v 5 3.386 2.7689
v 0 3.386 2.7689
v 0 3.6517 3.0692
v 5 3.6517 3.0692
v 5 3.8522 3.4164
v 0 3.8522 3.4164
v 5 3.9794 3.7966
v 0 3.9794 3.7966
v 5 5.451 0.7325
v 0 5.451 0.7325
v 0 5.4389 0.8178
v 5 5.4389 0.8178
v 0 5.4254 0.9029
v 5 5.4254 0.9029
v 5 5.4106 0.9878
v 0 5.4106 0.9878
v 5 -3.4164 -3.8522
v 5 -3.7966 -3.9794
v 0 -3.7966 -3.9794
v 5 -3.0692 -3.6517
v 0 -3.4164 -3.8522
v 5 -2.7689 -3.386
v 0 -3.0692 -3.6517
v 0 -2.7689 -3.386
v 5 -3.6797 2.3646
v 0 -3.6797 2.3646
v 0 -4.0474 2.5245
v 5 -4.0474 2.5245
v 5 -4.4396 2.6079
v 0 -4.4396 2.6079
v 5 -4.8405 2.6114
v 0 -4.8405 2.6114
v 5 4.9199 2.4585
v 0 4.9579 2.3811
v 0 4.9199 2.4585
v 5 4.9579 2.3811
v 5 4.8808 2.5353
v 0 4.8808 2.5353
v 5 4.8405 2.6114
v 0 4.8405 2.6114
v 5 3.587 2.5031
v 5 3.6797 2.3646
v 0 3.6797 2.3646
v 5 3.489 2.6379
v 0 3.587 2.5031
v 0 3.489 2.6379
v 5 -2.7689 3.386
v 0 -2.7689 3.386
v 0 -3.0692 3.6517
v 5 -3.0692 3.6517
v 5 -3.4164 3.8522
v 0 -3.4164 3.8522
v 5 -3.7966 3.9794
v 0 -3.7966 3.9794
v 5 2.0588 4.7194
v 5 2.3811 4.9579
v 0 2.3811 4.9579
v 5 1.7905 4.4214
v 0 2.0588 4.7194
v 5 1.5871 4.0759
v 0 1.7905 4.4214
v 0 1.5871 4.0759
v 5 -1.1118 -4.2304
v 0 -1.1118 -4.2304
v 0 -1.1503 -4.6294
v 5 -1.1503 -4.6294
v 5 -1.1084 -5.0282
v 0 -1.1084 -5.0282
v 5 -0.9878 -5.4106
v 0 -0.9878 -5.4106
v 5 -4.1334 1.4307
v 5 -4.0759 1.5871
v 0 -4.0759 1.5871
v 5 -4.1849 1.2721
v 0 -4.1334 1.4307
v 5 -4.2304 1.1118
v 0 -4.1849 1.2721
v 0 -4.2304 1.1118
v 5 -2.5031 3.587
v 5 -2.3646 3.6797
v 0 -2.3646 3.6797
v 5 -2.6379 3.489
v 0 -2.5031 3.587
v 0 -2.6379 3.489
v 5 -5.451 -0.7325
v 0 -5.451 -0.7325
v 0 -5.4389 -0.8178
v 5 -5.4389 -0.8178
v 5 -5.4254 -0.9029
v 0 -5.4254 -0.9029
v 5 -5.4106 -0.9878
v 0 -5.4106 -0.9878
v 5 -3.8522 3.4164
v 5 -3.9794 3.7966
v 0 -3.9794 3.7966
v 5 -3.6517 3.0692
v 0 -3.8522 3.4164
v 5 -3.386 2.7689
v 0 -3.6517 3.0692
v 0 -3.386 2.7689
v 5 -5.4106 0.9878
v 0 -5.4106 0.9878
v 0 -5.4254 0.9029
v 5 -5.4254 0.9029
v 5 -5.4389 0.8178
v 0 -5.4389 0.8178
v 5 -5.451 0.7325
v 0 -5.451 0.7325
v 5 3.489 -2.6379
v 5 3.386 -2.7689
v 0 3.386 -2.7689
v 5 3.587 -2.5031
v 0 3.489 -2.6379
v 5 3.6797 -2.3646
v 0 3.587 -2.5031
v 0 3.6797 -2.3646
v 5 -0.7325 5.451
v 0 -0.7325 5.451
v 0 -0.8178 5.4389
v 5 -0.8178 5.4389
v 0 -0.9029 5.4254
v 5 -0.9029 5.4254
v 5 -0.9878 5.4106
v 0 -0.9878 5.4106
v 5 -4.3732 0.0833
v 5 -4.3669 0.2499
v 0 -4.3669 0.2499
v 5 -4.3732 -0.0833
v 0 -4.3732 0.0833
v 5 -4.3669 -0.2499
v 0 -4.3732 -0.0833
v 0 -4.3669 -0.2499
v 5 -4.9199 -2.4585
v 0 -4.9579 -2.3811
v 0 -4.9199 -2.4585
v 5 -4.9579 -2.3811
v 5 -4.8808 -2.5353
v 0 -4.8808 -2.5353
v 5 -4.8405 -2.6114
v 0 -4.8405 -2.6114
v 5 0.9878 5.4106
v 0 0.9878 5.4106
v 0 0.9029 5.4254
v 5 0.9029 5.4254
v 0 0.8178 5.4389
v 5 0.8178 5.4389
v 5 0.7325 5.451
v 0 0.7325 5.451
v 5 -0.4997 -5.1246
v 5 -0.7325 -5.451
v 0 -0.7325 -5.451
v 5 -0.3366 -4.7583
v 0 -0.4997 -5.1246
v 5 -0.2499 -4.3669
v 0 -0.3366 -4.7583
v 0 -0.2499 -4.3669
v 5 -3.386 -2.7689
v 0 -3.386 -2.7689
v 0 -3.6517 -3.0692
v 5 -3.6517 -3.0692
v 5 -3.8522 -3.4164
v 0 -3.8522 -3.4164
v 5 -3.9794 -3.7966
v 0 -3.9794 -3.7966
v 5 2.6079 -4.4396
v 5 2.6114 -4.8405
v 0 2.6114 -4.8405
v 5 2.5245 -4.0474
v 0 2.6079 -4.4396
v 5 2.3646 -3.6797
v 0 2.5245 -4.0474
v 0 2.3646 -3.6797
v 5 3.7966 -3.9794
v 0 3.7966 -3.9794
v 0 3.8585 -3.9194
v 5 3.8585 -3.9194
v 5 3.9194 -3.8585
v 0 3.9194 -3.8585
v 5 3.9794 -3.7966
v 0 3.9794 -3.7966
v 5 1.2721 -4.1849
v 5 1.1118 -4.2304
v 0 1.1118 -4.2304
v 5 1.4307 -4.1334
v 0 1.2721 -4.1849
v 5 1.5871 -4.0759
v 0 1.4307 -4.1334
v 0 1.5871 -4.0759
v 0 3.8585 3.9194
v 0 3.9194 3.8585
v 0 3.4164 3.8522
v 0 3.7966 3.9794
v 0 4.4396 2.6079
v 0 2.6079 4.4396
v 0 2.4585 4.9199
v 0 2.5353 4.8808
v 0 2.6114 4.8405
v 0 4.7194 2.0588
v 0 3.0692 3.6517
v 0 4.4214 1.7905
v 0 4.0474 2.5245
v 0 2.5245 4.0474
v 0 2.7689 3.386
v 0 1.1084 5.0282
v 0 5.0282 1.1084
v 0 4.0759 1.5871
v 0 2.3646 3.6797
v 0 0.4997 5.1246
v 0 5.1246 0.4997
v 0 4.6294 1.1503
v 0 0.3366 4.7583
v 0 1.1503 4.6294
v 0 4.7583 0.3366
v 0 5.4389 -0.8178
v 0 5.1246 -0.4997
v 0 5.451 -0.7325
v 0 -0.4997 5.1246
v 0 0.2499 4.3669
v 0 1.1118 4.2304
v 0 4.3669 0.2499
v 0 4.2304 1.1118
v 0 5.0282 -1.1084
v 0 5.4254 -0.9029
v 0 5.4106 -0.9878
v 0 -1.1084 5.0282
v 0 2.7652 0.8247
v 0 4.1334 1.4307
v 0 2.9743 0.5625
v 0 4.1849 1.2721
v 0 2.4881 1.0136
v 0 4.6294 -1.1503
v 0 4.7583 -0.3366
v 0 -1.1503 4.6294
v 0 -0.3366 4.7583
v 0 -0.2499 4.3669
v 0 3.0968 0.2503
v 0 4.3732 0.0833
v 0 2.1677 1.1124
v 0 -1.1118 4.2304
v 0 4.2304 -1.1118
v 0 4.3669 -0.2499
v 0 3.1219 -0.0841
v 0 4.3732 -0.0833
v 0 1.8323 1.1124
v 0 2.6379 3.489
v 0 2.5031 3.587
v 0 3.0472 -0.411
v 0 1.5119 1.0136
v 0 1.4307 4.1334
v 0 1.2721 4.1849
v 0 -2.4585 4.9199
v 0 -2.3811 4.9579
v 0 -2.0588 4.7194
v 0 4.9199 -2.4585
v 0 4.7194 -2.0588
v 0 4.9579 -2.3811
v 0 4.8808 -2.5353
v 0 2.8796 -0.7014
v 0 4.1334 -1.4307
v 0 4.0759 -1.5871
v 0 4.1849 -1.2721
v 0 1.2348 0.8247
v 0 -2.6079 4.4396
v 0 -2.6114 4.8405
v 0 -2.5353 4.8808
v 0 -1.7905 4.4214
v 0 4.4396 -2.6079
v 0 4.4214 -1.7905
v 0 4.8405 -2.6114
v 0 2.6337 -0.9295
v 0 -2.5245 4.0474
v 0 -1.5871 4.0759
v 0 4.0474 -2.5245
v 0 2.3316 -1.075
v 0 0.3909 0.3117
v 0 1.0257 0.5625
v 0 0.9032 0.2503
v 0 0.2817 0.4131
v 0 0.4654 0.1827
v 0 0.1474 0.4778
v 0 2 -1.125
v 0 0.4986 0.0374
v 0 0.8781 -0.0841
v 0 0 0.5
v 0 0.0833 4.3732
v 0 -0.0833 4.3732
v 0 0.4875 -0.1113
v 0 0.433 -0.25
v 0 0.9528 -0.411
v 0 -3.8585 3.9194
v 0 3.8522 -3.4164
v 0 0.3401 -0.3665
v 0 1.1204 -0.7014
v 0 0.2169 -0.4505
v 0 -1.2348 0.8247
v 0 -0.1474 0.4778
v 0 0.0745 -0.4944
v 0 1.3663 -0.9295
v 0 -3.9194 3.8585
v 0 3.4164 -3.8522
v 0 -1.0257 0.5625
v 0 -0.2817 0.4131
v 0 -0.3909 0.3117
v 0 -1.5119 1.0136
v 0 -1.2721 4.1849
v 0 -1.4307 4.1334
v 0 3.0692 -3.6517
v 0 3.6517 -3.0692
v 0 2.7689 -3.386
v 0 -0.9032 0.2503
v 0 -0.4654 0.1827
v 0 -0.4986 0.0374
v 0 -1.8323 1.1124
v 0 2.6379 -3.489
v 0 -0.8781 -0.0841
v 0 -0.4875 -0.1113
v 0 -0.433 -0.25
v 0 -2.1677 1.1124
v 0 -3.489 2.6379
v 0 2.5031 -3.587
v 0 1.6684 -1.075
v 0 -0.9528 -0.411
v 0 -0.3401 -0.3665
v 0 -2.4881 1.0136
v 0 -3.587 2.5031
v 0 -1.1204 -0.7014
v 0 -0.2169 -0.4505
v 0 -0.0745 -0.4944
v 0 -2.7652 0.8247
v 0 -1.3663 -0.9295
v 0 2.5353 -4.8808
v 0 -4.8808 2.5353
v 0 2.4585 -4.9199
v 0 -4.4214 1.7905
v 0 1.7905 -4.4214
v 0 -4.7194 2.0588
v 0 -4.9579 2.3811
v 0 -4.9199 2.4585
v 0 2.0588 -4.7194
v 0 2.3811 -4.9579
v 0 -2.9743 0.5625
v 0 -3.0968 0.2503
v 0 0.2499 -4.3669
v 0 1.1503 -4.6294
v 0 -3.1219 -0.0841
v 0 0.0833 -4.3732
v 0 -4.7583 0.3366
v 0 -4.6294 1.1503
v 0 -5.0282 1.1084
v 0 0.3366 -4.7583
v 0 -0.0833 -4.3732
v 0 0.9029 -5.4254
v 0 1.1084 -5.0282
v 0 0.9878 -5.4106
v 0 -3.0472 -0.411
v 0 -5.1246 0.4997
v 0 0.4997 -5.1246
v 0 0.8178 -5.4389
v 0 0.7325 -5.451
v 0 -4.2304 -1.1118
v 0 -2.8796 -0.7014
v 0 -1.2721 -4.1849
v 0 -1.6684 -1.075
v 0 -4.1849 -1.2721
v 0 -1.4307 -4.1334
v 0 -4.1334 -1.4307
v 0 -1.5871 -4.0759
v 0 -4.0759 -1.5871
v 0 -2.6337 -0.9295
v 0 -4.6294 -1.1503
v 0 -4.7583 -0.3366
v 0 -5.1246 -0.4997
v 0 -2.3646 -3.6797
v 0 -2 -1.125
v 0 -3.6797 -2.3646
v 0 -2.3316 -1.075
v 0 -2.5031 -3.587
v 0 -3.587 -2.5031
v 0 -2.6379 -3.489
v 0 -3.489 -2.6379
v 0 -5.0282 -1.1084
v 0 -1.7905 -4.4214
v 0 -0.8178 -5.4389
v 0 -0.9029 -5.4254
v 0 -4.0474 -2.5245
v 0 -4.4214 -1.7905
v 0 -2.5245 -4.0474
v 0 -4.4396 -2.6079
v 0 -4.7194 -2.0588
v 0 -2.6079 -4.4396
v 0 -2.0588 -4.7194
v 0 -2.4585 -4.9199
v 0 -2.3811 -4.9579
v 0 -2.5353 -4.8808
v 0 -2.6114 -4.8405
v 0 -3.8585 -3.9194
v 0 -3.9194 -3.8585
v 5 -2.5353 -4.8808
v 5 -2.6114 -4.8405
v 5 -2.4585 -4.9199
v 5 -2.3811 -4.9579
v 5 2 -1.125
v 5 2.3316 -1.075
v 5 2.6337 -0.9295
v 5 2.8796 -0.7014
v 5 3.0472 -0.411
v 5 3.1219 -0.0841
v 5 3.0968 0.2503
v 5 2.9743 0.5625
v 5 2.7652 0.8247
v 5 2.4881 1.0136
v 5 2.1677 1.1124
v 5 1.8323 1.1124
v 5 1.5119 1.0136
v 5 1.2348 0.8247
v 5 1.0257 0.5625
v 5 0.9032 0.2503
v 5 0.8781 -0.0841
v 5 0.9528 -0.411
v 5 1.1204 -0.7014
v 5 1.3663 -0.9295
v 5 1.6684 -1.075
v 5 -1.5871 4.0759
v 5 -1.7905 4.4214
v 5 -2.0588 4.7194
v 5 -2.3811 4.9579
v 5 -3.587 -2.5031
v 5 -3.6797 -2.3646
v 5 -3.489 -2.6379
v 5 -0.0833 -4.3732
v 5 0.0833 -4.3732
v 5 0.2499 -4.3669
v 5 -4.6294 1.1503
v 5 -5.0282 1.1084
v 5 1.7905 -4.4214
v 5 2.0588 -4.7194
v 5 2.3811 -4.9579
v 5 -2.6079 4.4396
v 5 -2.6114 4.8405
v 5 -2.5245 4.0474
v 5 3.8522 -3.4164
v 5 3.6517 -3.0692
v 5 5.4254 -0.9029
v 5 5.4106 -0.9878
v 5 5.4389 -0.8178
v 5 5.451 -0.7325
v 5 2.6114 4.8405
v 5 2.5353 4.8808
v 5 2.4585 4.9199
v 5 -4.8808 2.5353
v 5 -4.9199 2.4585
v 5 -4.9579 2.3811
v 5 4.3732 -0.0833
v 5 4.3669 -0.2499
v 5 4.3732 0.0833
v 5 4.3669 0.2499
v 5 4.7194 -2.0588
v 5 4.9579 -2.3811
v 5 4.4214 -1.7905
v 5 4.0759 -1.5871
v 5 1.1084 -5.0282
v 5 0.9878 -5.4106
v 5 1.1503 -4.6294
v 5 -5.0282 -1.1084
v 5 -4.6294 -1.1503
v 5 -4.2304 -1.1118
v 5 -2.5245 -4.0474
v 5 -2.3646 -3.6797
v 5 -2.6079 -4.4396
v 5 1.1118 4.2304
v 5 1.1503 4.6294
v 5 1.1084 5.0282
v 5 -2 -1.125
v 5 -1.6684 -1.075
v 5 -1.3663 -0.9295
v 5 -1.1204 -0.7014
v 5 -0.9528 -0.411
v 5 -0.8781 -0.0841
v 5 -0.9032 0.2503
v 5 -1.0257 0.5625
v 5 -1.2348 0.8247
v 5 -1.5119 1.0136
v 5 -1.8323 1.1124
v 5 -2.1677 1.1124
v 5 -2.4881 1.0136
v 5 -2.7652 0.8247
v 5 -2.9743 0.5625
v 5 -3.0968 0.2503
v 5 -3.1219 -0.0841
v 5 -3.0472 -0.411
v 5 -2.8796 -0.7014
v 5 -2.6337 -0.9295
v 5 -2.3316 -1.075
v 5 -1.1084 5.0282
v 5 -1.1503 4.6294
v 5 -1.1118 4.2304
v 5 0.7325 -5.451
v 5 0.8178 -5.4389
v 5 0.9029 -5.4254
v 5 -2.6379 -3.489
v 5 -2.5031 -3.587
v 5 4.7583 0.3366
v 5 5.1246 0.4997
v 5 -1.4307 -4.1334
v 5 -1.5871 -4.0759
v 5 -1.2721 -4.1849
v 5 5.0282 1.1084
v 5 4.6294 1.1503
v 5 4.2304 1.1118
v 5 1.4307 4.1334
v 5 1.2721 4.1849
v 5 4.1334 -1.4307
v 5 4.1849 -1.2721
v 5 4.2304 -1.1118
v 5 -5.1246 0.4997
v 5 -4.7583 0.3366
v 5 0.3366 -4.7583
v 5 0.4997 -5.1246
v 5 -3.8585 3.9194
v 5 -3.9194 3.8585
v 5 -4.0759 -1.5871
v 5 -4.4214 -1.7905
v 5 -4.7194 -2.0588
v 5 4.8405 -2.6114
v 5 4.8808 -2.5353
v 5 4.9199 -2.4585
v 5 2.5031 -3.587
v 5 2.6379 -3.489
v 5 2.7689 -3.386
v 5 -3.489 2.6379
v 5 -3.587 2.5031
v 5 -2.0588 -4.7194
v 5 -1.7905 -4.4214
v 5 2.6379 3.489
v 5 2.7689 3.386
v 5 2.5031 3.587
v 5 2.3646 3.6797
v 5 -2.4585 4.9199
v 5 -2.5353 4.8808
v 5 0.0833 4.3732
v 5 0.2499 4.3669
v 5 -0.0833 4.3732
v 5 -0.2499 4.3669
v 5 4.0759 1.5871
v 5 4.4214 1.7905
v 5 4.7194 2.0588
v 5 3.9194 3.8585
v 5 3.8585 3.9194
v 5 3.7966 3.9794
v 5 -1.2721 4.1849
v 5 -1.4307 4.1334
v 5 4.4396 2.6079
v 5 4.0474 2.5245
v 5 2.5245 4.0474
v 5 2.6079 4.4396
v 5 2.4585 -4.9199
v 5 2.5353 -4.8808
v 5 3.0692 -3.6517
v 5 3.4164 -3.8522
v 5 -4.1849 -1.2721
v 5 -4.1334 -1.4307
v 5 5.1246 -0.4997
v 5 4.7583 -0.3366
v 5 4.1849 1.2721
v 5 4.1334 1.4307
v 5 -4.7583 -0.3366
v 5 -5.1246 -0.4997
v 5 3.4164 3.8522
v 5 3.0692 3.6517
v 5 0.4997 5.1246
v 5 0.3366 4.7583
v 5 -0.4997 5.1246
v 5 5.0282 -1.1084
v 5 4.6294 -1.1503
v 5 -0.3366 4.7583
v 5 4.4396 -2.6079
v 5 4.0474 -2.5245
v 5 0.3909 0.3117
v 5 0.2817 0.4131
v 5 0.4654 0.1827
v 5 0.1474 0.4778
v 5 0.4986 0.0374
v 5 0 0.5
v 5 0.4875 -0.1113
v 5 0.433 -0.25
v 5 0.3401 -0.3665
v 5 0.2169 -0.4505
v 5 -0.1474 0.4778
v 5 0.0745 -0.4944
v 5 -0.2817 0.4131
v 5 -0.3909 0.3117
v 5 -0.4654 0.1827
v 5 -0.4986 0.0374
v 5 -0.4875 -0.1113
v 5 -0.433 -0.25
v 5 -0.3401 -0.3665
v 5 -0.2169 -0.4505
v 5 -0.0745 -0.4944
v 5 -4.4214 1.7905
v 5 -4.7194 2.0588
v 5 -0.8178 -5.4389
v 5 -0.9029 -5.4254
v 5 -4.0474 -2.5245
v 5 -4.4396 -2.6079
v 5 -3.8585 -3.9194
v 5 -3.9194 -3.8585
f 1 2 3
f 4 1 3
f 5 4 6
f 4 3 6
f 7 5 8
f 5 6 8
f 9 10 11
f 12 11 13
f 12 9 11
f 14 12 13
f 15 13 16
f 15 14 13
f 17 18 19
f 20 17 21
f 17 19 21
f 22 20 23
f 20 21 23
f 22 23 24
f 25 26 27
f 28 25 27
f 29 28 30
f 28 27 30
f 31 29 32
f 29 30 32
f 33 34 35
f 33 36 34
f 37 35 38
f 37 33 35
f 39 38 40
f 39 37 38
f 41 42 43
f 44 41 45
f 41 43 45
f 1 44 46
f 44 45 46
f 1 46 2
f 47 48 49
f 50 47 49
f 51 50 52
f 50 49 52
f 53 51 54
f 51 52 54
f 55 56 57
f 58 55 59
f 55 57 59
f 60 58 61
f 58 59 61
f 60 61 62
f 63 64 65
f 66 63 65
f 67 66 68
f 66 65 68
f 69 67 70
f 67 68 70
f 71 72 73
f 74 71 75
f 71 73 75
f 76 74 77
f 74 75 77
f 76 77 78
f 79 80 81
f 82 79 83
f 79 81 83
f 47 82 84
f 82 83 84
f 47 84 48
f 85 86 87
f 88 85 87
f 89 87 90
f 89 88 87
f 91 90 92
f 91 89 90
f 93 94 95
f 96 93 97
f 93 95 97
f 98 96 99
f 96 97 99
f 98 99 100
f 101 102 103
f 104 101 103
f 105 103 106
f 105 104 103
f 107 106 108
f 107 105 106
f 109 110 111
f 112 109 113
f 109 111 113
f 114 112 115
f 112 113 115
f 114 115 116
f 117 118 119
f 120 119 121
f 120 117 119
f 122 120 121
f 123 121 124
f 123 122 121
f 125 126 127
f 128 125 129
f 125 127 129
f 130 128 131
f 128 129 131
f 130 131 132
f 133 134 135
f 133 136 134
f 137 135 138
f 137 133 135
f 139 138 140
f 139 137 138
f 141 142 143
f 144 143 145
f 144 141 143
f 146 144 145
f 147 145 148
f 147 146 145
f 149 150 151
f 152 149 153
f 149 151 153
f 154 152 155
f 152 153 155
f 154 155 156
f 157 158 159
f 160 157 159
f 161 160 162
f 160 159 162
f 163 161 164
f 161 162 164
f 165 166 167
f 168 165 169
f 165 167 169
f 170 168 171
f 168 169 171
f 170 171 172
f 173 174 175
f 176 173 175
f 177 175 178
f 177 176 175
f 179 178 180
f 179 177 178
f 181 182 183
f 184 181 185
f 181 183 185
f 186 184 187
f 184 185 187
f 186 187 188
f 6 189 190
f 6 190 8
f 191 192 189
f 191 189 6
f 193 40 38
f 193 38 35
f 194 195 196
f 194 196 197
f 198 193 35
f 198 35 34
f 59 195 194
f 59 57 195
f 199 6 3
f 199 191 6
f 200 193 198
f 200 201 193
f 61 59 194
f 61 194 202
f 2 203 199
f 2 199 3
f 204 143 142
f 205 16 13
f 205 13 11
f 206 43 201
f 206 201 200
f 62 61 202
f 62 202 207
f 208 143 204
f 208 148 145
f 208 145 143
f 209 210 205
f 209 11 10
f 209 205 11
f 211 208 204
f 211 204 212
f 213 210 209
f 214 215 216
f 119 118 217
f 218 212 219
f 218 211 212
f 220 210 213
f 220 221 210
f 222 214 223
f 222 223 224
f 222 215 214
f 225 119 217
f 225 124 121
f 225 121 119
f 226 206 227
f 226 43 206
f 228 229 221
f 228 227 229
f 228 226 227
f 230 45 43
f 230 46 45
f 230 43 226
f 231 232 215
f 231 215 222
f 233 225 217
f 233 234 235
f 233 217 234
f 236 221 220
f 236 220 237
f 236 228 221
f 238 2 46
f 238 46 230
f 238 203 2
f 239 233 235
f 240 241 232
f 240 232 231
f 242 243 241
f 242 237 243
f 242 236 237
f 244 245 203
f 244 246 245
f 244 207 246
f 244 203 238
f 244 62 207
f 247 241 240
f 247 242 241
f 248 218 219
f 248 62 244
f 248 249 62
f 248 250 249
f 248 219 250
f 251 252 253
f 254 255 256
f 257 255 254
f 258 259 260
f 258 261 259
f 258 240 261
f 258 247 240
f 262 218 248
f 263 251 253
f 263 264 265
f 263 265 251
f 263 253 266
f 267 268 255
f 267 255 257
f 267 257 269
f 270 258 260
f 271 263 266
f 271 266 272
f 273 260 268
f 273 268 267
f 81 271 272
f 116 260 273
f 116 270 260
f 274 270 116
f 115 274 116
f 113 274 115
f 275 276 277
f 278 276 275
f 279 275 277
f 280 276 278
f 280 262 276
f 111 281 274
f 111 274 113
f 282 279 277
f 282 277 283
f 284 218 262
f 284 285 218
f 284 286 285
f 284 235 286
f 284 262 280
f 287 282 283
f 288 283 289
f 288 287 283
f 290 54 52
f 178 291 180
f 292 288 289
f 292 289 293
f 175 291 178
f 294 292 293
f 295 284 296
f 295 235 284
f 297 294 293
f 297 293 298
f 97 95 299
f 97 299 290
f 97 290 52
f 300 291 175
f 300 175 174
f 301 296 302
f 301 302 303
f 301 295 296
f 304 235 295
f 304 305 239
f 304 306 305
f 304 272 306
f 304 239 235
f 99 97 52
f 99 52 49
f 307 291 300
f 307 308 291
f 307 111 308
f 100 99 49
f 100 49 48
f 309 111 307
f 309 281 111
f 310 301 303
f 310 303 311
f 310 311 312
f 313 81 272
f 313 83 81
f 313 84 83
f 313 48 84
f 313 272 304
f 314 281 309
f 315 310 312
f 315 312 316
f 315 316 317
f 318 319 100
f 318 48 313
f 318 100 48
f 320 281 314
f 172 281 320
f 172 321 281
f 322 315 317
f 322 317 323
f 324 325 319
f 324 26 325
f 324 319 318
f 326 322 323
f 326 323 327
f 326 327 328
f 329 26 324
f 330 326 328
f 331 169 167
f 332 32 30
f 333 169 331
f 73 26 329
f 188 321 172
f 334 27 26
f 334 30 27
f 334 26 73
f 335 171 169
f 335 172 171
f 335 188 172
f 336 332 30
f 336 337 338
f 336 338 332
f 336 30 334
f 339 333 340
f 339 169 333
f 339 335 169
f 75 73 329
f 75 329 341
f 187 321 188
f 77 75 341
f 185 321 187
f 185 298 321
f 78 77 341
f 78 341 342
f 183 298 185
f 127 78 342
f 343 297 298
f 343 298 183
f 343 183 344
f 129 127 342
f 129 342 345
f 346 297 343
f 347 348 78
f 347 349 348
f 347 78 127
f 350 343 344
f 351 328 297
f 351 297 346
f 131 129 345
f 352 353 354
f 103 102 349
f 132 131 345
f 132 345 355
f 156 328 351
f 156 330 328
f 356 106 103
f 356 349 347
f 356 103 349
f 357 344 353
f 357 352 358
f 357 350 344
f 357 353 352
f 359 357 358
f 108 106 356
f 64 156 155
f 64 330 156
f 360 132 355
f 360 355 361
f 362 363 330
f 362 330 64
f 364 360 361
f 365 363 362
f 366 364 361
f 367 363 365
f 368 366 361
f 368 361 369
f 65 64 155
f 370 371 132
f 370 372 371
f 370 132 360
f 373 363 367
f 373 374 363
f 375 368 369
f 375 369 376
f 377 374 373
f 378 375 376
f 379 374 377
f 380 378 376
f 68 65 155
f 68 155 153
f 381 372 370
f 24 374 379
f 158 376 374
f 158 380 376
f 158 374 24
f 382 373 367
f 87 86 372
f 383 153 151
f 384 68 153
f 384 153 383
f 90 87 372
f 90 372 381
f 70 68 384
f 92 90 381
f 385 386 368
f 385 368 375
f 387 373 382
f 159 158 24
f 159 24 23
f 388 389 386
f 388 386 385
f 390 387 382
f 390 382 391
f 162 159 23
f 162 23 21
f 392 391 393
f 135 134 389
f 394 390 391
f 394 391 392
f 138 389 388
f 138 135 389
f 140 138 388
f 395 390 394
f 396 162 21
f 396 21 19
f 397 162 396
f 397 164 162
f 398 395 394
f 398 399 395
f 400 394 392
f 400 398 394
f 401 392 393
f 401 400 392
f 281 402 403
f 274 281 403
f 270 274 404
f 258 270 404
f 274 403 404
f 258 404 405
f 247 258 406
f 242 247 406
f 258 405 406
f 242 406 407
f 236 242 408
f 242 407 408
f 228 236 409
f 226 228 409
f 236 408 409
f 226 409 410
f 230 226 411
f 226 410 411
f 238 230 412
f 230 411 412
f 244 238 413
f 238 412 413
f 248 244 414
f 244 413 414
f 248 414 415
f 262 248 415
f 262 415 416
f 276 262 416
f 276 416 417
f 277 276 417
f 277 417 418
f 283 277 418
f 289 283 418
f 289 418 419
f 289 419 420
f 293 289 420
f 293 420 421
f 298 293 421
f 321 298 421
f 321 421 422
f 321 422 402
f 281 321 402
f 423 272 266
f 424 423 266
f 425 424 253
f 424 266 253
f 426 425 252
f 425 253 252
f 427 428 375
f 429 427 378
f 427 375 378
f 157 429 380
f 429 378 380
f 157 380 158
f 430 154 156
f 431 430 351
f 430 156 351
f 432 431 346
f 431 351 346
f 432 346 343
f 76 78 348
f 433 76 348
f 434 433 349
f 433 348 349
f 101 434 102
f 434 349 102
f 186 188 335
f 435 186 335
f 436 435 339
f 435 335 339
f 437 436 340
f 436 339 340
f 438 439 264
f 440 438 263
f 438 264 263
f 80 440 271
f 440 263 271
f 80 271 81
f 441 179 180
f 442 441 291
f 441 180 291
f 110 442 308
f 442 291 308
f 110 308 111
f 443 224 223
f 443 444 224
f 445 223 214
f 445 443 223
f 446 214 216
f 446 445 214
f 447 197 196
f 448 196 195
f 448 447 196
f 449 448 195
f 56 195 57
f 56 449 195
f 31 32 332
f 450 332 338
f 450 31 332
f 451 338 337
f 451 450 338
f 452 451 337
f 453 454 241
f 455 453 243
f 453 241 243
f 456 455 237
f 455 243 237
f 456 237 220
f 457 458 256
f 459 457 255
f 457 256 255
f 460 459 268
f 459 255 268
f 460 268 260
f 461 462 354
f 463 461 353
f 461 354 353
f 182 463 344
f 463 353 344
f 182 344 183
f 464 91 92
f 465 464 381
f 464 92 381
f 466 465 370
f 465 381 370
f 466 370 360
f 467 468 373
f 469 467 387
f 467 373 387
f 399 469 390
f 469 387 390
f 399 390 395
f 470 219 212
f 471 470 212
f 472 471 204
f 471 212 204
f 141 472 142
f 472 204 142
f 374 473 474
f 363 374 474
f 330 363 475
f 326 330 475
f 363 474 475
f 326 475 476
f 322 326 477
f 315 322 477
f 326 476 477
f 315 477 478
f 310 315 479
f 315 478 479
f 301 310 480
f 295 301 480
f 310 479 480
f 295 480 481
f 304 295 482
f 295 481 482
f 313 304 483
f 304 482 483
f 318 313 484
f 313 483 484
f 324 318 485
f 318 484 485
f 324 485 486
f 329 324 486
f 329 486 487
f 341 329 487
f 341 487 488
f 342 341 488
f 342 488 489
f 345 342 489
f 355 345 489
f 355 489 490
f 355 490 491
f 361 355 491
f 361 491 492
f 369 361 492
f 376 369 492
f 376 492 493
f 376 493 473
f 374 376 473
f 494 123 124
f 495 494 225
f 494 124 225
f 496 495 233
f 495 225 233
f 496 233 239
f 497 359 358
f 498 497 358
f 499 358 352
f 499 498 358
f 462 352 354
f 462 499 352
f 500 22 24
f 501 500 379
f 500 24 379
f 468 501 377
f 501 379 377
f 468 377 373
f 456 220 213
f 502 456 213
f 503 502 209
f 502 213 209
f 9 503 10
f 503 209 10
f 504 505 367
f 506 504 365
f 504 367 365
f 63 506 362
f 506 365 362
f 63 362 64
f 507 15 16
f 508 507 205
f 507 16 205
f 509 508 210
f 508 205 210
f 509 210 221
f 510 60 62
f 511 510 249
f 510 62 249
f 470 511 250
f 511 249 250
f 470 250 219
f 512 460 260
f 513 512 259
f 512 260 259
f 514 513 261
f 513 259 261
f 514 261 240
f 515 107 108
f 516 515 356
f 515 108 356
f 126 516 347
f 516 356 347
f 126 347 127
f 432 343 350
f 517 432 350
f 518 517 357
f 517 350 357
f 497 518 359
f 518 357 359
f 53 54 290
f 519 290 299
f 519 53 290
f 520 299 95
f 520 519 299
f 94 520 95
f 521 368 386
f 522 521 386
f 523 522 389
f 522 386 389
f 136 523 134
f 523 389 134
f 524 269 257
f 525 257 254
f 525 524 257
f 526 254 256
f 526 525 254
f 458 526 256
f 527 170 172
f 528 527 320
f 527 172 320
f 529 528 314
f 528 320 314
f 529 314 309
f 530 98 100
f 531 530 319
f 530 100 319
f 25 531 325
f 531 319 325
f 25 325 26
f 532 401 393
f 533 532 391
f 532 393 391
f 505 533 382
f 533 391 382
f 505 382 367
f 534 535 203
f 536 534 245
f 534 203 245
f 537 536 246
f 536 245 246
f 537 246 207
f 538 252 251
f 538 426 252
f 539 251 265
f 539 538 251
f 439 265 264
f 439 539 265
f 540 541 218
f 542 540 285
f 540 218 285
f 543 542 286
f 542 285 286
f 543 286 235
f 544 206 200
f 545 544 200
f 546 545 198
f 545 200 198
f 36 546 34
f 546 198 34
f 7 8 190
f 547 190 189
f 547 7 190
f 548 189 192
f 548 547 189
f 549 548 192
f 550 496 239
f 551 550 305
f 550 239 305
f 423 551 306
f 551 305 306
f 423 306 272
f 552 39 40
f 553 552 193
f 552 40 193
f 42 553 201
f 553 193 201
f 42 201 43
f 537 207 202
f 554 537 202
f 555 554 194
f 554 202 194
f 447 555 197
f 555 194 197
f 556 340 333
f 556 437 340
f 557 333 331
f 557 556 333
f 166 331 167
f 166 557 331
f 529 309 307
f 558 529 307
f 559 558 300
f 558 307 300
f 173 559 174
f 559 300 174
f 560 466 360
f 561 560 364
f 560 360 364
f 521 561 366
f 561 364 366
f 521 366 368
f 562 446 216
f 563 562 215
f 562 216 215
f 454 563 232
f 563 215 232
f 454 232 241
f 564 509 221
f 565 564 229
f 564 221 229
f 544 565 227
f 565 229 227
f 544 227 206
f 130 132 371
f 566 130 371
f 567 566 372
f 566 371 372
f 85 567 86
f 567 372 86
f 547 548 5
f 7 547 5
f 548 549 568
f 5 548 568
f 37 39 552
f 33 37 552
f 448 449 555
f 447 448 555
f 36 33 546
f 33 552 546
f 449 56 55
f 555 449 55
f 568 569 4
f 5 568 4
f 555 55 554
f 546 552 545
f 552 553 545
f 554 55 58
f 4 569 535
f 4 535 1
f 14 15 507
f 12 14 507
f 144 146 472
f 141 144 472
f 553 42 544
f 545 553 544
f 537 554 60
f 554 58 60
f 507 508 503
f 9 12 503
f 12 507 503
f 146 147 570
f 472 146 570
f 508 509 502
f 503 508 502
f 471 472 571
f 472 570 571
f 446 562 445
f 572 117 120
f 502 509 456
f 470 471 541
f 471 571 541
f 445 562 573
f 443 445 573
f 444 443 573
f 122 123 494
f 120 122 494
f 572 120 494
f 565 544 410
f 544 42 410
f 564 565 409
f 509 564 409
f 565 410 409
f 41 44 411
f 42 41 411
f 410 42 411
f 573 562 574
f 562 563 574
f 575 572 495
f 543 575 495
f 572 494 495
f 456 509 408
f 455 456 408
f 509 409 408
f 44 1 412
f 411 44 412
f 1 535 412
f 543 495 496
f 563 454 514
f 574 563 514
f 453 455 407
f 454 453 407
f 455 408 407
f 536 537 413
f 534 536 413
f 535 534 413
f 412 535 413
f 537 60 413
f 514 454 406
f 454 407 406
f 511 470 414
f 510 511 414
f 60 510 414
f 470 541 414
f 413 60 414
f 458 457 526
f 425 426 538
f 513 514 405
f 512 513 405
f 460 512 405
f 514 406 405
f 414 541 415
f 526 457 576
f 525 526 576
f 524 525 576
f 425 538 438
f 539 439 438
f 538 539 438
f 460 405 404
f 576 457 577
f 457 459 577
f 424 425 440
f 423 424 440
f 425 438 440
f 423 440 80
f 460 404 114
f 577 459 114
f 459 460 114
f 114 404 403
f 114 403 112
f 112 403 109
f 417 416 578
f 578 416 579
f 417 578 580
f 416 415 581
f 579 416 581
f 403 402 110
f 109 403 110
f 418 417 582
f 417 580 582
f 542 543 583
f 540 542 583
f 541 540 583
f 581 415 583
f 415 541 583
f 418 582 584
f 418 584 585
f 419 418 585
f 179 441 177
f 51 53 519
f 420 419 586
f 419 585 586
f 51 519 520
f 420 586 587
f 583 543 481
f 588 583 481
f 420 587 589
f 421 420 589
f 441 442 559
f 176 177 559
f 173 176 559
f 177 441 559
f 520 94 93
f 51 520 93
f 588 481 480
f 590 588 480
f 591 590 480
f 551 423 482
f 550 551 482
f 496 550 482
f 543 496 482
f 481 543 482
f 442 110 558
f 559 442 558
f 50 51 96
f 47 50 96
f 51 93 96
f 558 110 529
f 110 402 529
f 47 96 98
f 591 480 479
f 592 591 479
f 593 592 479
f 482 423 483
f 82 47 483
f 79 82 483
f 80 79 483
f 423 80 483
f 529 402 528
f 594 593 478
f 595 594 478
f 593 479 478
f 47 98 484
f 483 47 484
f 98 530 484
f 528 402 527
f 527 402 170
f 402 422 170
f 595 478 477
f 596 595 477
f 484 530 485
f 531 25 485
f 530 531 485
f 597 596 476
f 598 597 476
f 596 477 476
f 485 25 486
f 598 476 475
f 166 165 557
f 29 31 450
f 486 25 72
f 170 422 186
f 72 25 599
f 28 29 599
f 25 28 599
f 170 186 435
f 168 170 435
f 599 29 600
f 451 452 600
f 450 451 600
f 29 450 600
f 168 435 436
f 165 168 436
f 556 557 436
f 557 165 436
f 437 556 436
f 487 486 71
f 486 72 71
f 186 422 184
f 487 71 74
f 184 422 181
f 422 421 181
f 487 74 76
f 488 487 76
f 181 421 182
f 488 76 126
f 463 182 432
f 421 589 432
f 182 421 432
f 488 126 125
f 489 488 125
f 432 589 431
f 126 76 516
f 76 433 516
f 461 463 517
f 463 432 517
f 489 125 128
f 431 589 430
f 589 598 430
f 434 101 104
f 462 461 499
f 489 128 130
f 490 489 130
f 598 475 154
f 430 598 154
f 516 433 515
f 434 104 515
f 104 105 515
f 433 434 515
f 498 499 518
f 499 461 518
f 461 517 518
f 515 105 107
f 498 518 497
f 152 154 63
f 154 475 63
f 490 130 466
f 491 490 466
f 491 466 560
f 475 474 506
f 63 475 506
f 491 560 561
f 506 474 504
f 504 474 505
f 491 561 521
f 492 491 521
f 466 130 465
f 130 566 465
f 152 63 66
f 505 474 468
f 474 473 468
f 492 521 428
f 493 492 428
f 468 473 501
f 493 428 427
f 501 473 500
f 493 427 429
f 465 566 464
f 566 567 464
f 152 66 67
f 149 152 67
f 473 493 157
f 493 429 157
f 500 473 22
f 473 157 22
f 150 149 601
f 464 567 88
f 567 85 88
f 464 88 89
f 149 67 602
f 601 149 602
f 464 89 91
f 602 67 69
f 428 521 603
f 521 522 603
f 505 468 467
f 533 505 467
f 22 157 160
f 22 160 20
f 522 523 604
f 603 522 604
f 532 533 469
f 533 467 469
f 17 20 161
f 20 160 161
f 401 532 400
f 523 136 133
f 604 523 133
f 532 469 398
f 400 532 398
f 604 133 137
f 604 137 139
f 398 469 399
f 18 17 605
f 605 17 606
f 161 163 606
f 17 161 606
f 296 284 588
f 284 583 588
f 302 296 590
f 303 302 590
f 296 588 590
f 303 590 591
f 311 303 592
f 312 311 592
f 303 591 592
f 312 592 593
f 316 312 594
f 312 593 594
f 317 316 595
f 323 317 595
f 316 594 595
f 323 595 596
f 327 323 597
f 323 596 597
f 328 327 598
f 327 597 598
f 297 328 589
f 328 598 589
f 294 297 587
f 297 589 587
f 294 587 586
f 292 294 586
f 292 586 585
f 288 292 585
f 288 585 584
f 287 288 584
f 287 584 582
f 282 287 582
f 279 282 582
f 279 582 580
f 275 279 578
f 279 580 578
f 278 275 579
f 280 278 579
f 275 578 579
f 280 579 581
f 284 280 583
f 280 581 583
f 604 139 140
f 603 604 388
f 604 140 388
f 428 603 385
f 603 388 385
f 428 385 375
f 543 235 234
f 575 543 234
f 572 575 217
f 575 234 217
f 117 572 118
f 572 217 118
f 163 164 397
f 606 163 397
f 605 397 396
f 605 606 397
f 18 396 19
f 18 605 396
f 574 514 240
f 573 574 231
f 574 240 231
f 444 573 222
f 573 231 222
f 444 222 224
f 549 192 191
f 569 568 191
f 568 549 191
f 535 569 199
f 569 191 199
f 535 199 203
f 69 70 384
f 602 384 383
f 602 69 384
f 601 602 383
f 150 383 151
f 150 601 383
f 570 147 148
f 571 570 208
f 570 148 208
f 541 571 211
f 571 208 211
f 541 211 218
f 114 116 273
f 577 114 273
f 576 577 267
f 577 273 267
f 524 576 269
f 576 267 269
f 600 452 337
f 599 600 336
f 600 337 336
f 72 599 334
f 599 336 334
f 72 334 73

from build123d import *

# Parameters (mm, degrees)
BASPROSKE_W             = 5
BASPROSKE_H             = 5.5
TOOTHCUT_DEPTH          = 10.246621004
TEETHCUTS_COUNT         = 20
TEETHCUTS_ANGLE         = 342
BORSKE_R                = 0.5
BORE_DEPTH              = 50.0000508
SKETCH1_R               = 1.125
CUT_EXTRUDE1_DEPTH      = 10.188413972
CUT_EXTRUDE1_DEPTH_BACK = 10.188413972


with BuildPart() as part:
    # BasProSke → Base-Revolve (revolve)
    with BuildSketch(Plane(origin=(0, 0, 0), x_dir=(1, 0, 0), z_dir=(0, 1, 0)), mode=Mode.PRIVATE) as base_revolve_sk:
        with Locations((2.5, 2.75)):
            Rectangle(BASPROSKE_W, BASPROSKE_H)
    revolve(base_revolve_sk.sketch.rotate(Axis((-10, 0, 0), (1, 0, 0)), 180), axis=Axis((-10, 0, 0), (1, 0, 0)))

    # TooCutSke → ToothCut (cut, through all)
    with BuildSketch(Plane(origin=(0, 0, 0), x_dir=(0, 0, -1), z_dir=(1, 0, 0))):
        with BuildLine():
            ThreePointArc((0.249903181, 4.366855207), (0, 4.374), (-0.249903181, 4.366855207))
            ThreePointArc((-0.249903181, 4.366855207), (-0.415207844, 4.95951031), (-0.752843848, 5.473871692))
            ThreePointArc((-0.752843848, 5.473871692), (0, 5.5254), (0.752843848, 5.473871692))
            ThreePointArc((0.752843848, 5.473871692), (0.415207844, 4.95951031), (0.249903181, 4.366855207))
        make_face()
    toothcut = extrude(amount=TOOTHCUT_DEPTH, mode=Mode.SUBTRACT)

    # TeethCuts: ToothCut ×20 about axis
    teethcuts_axis = Axis((-10, 0, 0), (1, 0, 0))
    for i in range(1, TEETHCUTS_COUNT):
        add(toothcut.rotate(teethcuts_axis, i * TEETHCUTS_ANGLE / (TEETHCUTS_COUNT - 1)), mode=Mode.SUBTRACT)

    # BorSke → Bore (cut, symmetric)
    with BuildSketch(Plane(origin=(0, 0, 0), x_dir=(0, 0, -1), z_dir=(1, 0, 0))):
        with Locations(Location((0, 0, 0), (0, 0, 180))):
            Circle(BORSKE_R)
    extrude(amount=BORE_DEPTH, both=True, mode=Mode.SUBTRACT)

    # Sketch1 → Cut-Extrude1 (cut, two sides)
    with BuildSketch(Plane(origin=(5, 0, 0), x_dir=(0, 0, -1), z_dir=(1, 0, 0))) as cut_extrude1_sk:
        with Locations((0, 2)):
            Circle(SKETCH1_R)
        with Locations((0, -2)):
            Circle(SKETCH1_R)
    extrude(amount=CUT_EXTRUDE1_DEPTH, mode=Mode.SUBTRACT)
    extrude(cut_extrude1_sk.sketch, amount=-CUT_EXTRUDE1_DEPTH_BACK, mode=Mode.SUBTRACT)


solid = part.part
